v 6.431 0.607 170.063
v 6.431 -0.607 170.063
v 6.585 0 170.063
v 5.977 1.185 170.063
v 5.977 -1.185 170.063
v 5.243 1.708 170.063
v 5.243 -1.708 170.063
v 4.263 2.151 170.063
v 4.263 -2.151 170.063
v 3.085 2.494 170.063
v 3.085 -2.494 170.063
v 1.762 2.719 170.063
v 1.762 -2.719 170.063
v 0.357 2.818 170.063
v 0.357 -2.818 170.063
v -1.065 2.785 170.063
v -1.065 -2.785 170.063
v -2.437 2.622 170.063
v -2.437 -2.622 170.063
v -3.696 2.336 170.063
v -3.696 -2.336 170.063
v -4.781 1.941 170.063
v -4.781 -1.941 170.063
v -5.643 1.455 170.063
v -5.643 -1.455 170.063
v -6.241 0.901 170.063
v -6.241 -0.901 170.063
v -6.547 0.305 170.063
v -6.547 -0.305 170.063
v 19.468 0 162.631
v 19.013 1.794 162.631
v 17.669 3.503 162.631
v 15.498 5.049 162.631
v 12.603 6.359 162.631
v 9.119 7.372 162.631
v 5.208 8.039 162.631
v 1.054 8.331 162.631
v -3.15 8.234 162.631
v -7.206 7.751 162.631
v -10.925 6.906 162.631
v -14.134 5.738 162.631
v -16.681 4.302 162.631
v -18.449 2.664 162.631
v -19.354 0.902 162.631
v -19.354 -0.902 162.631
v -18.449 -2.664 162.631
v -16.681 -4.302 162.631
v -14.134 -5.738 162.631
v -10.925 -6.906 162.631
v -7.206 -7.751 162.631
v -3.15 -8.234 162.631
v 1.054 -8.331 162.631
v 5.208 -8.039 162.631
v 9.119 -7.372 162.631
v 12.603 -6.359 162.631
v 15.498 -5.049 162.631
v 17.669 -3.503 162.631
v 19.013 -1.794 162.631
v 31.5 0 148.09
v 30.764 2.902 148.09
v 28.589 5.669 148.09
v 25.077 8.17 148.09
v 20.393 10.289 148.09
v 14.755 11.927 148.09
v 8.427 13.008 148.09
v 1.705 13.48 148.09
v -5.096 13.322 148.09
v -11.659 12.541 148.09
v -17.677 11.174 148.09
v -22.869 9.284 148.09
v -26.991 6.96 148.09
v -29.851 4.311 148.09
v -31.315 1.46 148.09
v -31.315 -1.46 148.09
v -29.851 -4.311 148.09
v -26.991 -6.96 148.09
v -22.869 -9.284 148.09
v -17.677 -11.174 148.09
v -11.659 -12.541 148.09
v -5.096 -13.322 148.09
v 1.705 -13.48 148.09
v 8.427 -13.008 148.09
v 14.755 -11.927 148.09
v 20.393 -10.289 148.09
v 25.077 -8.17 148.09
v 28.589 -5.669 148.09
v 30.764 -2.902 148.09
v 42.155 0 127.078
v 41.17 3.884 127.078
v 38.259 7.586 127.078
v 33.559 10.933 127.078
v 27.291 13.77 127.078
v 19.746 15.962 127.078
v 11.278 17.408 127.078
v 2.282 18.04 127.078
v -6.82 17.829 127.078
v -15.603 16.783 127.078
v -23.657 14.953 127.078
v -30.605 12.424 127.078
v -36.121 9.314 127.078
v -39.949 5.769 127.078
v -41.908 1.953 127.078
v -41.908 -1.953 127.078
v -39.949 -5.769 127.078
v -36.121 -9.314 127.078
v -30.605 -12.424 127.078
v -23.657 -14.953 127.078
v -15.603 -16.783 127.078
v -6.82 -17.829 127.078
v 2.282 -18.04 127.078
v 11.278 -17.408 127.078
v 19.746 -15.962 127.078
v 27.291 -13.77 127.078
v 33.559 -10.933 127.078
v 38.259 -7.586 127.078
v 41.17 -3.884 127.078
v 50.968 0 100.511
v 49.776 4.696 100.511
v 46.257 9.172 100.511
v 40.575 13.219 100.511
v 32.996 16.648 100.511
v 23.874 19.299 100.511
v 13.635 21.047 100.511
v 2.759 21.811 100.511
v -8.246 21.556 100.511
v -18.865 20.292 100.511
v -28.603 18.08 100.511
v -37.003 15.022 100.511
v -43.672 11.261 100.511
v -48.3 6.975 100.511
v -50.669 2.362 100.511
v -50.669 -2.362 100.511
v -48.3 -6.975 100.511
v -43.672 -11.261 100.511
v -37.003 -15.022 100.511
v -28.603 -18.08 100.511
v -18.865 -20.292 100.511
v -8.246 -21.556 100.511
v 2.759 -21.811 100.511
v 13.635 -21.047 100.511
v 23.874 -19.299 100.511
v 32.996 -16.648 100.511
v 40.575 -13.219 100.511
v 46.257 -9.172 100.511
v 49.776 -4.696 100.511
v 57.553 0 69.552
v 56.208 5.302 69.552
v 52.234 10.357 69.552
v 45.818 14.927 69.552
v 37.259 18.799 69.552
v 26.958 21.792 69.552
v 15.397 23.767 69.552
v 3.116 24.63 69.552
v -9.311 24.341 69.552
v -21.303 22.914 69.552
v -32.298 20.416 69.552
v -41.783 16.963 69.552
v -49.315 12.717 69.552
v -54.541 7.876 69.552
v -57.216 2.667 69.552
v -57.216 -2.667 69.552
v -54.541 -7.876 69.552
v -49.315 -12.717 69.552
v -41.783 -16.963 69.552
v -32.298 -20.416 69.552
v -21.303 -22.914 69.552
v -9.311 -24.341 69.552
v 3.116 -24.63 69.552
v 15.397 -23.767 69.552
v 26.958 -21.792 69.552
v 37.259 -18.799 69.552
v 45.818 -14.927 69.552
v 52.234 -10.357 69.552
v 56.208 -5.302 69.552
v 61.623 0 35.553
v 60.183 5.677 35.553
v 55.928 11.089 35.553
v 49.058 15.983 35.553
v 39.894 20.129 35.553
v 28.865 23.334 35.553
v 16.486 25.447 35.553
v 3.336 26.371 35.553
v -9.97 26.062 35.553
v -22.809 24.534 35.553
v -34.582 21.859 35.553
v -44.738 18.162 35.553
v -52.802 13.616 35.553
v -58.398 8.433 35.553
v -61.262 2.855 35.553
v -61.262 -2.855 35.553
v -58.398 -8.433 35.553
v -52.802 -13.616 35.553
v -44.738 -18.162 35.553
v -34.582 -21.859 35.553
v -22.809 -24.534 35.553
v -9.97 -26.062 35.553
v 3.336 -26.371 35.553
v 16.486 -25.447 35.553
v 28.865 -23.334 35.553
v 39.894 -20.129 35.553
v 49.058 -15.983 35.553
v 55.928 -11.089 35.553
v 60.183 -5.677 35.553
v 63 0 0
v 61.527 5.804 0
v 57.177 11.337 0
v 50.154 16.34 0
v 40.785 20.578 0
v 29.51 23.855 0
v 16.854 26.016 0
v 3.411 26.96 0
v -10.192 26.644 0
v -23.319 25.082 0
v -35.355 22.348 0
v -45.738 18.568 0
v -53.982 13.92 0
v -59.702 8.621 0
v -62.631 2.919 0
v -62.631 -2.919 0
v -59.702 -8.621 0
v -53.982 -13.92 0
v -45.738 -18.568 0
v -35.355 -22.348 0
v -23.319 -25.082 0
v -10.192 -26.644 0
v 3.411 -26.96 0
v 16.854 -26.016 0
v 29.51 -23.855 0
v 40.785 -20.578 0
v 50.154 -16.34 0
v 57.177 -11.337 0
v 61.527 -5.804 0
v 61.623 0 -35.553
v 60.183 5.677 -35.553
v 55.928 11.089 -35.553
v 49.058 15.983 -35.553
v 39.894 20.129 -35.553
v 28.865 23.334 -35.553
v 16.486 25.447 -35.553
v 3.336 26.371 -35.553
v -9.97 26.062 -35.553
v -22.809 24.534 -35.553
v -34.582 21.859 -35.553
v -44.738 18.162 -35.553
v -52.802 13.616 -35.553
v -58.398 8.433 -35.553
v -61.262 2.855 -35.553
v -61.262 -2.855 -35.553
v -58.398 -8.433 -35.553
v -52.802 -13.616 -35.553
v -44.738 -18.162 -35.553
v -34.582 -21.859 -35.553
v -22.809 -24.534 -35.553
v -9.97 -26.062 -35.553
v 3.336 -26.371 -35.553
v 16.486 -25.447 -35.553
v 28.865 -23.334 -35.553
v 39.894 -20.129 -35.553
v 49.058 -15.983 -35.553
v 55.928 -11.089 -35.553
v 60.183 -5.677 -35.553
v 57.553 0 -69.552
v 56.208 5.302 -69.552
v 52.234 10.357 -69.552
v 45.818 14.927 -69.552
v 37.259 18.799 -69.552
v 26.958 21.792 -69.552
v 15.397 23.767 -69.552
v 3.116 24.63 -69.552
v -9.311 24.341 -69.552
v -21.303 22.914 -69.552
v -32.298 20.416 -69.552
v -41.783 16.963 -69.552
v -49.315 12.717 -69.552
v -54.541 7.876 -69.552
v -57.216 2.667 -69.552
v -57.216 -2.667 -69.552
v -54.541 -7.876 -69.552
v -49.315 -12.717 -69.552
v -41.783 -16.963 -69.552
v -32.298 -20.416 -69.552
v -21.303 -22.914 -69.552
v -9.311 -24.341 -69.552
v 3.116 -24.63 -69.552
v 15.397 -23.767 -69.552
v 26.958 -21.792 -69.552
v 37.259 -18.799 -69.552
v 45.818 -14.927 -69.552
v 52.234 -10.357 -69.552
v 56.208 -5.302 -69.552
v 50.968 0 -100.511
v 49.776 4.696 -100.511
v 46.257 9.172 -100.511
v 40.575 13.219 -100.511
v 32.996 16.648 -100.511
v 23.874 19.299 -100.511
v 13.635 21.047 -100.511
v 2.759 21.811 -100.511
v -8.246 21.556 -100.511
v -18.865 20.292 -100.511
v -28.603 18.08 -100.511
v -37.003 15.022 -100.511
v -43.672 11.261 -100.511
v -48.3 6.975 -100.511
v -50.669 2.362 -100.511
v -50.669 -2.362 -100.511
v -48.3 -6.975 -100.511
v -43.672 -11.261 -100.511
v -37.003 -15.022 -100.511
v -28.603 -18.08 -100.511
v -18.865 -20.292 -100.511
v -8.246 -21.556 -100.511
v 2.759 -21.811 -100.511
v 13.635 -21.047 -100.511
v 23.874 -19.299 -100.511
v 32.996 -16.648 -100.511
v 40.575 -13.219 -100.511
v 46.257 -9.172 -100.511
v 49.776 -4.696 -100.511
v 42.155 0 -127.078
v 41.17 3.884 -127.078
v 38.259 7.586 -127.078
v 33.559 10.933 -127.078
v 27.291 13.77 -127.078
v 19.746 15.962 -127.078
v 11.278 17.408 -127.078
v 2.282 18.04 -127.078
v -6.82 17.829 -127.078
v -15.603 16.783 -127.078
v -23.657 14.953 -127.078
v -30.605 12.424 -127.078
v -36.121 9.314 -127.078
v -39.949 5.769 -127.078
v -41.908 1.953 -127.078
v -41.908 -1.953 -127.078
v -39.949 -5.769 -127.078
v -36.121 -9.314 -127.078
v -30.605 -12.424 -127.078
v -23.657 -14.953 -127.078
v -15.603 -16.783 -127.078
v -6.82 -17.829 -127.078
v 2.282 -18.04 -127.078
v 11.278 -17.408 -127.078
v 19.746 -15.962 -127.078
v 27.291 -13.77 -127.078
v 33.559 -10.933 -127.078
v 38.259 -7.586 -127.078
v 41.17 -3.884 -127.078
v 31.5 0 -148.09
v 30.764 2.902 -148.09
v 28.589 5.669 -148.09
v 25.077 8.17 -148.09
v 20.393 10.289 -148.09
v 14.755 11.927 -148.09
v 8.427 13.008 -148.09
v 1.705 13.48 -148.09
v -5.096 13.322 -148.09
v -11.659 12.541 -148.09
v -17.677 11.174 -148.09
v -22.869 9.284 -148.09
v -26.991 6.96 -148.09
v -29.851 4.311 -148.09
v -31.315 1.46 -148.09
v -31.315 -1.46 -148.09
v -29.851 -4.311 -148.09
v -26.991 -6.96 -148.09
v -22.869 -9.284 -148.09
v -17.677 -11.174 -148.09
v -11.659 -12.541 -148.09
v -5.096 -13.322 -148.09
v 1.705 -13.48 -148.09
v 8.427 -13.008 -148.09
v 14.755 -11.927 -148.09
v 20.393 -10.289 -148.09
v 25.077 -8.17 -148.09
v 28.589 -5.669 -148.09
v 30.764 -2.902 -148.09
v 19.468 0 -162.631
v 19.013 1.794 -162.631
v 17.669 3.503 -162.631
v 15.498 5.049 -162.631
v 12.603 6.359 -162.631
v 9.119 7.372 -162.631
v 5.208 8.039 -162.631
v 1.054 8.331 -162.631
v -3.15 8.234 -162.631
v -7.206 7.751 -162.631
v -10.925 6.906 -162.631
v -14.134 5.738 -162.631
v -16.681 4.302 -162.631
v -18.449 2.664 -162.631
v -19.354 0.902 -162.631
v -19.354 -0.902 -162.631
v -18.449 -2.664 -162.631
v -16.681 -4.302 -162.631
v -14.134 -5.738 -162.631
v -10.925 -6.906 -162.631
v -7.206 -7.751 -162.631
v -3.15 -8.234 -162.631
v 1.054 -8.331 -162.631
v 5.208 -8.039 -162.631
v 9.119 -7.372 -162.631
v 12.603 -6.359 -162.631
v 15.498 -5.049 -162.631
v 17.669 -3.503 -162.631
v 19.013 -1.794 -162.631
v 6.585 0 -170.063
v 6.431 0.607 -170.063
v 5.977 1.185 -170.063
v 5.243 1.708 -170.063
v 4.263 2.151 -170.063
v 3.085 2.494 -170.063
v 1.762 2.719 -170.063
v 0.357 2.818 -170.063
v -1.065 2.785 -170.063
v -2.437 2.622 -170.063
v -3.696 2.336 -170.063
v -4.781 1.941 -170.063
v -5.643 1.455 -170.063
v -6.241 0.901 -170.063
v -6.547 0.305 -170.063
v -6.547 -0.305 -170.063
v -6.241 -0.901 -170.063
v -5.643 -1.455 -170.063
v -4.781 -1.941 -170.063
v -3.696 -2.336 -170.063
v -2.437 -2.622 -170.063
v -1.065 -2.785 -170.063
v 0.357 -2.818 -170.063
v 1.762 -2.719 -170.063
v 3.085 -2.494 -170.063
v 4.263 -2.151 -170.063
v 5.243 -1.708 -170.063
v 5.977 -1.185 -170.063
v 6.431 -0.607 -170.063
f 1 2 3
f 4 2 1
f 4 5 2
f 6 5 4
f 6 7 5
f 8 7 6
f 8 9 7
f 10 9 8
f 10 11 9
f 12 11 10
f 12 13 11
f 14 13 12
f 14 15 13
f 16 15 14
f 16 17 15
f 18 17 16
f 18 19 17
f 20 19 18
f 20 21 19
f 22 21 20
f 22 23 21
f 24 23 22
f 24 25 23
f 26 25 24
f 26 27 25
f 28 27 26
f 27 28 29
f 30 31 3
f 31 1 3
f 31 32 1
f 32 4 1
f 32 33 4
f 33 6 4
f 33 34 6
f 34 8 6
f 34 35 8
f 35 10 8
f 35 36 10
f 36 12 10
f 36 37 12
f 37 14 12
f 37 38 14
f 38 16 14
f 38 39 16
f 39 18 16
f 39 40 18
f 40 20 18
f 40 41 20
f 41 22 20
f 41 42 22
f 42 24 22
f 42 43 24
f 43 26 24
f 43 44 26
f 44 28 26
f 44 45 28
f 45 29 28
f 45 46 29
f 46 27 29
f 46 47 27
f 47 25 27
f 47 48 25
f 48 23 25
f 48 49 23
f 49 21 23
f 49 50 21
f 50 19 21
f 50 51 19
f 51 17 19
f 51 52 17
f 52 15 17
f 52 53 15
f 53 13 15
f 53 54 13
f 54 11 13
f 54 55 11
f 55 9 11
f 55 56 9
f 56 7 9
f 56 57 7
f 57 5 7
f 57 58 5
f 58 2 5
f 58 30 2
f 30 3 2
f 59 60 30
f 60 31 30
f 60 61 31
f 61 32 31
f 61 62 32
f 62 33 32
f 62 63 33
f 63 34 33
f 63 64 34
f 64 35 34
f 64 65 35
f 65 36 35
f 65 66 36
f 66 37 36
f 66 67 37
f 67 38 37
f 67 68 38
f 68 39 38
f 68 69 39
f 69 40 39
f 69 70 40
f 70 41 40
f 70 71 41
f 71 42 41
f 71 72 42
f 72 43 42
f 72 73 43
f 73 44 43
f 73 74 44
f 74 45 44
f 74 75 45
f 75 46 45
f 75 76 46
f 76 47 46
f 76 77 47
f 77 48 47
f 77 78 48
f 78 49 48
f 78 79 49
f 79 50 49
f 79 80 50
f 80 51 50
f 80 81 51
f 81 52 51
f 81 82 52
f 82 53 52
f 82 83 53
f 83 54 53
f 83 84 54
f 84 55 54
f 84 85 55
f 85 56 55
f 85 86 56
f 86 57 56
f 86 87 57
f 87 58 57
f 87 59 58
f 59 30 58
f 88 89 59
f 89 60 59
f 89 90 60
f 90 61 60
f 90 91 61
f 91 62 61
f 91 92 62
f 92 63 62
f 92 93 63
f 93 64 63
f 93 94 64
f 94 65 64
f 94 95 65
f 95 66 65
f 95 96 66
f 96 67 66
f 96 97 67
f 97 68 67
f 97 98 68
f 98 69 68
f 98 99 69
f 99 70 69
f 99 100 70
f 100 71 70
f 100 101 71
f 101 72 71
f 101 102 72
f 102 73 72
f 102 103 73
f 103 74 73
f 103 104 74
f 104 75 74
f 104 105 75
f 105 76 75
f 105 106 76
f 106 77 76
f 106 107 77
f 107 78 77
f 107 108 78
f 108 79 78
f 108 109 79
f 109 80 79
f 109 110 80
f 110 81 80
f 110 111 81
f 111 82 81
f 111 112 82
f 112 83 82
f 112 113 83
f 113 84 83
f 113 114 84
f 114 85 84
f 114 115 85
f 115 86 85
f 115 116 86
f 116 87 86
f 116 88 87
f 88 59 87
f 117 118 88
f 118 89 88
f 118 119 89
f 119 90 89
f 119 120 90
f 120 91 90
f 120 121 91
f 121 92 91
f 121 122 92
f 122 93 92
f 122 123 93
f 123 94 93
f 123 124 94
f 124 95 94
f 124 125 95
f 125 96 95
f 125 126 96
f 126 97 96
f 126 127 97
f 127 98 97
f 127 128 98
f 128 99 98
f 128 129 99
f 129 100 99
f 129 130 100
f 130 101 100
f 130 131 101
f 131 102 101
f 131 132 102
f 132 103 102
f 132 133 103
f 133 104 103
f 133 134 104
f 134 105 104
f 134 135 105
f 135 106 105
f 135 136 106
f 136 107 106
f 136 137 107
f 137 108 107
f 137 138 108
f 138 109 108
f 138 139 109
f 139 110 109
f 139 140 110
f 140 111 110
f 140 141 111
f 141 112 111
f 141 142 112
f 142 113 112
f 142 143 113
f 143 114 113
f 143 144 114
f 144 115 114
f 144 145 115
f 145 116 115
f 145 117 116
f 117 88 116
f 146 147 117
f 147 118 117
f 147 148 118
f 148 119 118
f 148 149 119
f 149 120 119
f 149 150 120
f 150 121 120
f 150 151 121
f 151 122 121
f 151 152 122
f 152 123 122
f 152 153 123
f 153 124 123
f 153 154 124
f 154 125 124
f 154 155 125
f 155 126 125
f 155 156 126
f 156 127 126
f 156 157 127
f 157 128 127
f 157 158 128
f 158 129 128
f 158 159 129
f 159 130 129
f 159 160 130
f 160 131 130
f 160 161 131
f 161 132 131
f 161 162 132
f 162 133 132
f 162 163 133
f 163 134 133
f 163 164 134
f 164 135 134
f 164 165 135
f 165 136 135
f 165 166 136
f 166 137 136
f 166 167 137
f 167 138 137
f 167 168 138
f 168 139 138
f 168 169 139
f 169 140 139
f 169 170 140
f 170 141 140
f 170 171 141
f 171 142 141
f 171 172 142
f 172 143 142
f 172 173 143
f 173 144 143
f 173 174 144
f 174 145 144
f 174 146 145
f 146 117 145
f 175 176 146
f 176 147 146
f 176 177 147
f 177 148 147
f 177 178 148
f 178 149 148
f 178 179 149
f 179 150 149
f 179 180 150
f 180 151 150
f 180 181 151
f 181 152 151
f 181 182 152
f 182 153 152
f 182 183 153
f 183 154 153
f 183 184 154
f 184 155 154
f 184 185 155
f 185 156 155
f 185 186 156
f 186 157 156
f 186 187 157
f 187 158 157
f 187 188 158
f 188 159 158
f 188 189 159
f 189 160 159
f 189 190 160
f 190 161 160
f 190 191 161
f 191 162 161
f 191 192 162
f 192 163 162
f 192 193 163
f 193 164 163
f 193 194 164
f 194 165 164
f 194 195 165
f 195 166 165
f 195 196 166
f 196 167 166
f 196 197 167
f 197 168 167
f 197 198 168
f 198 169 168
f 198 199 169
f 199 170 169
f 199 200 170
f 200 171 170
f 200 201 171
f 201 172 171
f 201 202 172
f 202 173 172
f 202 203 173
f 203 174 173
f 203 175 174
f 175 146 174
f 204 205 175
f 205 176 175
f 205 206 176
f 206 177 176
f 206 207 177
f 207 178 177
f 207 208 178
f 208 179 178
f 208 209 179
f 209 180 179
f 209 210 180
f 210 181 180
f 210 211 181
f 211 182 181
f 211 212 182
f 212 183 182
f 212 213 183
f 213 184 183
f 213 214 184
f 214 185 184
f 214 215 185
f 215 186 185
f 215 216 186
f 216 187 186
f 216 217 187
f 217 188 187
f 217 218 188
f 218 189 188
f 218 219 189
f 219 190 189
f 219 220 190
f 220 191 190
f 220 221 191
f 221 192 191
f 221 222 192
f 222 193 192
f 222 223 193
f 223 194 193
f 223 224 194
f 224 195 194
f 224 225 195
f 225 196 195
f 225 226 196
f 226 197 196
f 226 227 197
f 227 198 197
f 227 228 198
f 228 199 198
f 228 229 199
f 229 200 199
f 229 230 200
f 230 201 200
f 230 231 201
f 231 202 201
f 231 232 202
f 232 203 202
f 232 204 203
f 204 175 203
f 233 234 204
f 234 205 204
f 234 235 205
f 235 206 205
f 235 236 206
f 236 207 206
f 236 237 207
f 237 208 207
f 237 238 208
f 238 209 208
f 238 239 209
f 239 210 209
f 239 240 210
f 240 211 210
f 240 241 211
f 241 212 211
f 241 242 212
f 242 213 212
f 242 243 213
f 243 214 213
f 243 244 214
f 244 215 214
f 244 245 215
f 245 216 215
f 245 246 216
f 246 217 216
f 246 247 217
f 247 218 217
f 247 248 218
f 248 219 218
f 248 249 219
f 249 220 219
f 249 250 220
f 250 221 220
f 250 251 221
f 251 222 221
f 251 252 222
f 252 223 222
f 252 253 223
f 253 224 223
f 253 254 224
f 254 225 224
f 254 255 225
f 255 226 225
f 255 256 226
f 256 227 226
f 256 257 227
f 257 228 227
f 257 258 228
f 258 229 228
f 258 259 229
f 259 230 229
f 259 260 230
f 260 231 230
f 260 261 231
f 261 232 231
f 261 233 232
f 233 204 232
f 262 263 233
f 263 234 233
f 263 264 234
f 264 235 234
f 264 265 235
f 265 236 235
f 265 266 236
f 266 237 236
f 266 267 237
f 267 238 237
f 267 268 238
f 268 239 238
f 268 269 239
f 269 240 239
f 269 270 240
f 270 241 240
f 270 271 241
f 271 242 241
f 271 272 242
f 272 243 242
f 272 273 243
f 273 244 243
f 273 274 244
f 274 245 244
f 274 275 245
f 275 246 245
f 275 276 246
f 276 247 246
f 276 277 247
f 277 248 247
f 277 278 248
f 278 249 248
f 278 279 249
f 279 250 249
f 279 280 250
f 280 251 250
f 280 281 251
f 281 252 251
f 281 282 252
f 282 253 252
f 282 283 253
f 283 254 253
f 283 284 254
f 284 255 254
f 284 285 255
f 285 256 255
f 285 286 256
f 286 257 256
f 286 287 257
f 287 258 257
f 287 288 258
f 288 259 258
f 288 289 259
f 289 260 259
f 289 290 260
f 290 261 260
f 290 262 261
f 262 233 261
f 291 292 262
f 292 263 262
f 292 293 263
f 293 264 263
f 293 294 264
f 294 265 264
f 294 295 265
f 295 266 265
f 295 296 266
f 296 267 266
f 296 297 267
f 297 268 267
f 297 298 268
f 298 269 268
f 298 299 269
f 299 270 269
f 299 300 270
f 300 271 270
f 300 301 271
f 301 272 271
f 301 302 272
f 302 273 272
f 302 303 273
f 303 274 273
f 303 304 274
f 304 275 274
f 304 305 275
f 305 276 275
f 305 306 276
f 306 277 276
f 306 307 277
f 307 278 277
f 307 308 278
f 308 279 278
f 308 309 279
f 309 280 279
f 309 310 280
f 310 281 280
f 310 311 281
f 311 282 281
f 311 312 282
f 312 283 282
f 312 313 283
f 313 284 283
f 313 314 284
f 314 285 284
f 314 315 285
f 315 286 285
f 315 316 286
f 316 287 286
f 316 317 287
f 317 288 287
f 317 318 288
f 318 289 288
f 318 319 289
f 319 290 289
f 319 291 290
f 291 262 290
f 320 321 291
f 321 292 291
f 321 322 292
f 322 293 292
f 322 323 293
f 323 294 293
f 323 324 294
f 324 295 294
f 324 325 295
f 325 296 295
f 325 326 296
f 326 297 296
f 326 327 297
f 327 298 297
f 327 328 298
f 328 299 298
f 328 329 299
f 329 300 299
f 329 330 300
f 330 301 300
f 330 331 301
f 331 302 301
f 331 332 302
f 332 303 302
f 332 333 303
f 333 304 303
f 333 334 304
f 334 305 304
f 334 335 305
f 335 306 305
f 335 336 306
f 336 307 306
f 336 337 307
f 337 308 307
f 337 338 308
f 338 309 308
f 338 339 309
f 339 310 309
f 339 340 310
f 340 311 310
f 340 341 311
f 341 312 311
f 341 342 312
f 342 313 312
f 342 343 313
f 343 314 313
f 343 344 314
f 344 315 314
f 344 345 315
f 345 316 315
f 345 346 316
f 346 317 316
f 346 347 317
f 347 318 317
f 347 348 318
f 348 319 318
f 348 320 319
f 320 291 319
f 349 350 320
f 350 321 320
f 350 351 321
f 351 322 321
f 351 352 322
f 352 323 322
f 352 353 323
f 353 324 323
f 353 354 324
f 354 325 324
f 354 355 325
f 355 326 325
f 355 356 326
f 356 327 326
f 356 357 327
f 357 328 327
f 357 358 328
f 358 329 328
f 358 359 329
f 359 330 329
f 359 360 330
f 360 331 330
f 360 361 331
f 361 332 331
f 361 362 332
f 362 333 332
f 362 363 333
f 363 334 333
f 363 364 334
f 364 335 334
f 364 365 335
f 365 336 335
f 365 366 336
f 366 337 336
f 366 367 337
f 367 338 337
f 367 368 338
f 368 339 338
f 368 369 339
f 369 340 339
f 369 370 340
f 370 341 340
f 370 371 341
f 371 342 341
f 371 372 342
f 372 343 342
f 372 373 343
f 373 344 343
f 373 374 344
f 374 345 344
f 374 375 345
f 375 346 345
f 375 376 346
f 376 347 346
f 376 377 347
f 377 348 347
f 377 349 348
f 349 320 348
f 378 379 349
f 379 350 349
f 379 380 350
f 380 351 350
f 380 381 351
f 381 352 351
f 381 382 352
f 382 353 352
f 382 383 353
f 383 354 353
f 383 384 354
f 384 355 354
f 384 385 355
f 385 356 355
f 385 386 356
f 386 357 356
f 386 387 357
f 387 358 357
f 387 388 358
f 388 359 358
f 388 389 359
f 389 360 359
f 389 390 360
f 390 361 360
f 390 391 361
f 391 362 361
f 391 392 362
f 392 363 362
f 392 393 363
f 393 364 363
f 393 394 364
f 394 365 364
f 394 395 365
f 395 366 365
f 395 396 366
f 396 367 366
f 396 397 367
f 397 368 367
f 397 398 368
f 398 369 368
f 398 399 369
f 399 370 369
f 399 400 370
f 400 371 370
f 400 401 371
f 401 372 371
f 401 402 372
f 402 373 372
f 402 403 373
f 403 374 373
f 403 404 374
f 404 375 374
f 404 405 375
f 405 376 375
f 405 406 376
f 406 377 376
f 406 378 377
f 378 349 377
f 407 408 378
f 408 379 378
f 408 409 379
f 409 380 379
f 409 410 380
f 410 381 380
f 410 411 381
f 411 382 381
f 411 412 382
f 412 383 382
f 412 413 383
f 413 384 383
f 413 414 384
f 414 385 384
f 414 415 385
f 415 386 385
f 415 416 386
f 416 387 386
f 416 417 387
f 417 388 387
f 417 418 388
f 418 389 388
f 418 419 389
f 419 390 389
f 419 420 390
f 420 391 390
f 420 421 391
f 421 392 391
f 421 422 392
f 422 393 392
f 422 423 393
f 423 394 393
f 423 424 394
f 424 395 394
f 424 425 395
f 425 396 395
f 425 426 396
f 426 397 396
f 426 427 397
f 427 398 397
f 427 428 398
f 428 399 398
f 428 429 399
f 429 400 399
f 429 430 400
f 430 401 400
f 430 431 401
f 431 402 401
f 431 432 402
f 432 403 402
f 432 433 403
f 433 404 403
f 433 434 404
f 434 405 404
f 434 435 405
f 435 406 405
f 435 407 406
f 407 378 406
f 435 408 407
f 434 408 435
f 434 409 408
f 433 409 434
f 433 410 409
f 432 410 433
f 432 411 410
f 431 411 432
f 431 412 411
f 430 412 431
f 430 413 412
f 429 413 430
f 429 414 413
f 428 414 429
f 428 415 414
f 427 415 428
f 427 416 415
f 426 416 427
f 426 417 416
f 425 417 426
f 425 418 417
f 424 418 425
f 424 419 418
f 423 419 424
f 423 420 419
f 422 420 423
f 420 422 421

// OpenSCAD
// Generated by SolidPython 1.0.1 on 2020-07-29 00:46:47


scale(v = [7, 3, 19]) {
	sphere(r = 9);
}
/***********************************************
*********      SolidPython code:      **********
************************************************
 
# import packages: SolidPython
from solid import *
from solid.utils import *
from itertools import chain, combinations, permutations


class Resize:

    def __init__(self, scad_file):
        self.scad_file = scad_file
        #self.scad_file = import_scad(scad_file)
        # cone/cylinder param:
        self.r1 = 0
        self.r2 = 0
        self.h = 0
        # rectangular prism param:
        self.w = 0
        self.l = 0
        # ellipse param:
        self.r = 0

    # import OpenScad code (file name corresponds to shape)


    # classify shape + parameters
    def assign(self, param1, param2, param3):
        if self.scad_file == 'cone.scad':
            self.r1 = param1
            self.r2 = param2
            self.h = param3
        elif self.scad_file == 'cylinder.scad':
            self.r1 = param1
            self.r2 = param2
            self.h = param3
        elif self.scad_file == 'rectangularPrism.scad':
            self.h = param1
            self.l = param2
            self.w = param3
        else:
            self.r = param1
            self.h = param2

    # resize parameters
    def iterate(self):
        x = range(3, 20, 2)
        i = 1
        if self.scad_file == 'cone.scad':
            tempList = list(permutations(x, 2))
            for temp in tempList:
                param1 = temp[0]
                param2 = temp[1]
                filepath = 'produced_scad_files/' + 'cone' + str(param1) + '_' + str(param2) + '_' + '.scad'
                scad_render_to_file(cylinder(h=param1, r1=param2, r2=0), filepath)

        elif self.scad_file == 'cylinder.scad':
            tempList = list(permutations(x, 3))
            for temp in tempList:
                param1 = temp[0]
                param2 = temp[1]
                filepath = 'produced_scad_files/' + 'cylinder' + str(param1) + '_' + str(param2) + '_' + '.scad'
                scad_render_to_file(cylinder(h=param1, r1=param2, r2=param2), filepath)

        elif self.scad_file == 'rectangularPrism.scad':
            tempList = list(permutations(x, 3))
            for temp in tempList:
                param1 = temp[0]
                param2 = temp[1]
                param3 = temp[2]
                filepath = 'produced_scad_files/' + 'rectangularPrism' + str(param1) + '_' + str(param2) + '_' + str(
                    param3) + '.scad'
                scad_render_to_file(cube(size=(param1, param2, param3)), filepath)

        elif self.scad_file == 'ellipse.scad':
            tempList = list(permutations(x, 4))
            for temp in tempList:
                param1 = temp[0]
                param2 = temp[1]
                param3 = temp[2]
                param4 = temp[3]
                filepath = 'produced_scad_files/' + 'ellipse' + str(param1) + '_' + str(param2) + '_' + str(param3) + '_' + str(param4) + '.scad'
                scad_render_to_file(scale([param1, param2, param3])(sphere(r=param4)), filepath)

    def render_to_scadfile(self):
        scad_render_to_file(scad, 'example.scad') 
 
************************************************/
